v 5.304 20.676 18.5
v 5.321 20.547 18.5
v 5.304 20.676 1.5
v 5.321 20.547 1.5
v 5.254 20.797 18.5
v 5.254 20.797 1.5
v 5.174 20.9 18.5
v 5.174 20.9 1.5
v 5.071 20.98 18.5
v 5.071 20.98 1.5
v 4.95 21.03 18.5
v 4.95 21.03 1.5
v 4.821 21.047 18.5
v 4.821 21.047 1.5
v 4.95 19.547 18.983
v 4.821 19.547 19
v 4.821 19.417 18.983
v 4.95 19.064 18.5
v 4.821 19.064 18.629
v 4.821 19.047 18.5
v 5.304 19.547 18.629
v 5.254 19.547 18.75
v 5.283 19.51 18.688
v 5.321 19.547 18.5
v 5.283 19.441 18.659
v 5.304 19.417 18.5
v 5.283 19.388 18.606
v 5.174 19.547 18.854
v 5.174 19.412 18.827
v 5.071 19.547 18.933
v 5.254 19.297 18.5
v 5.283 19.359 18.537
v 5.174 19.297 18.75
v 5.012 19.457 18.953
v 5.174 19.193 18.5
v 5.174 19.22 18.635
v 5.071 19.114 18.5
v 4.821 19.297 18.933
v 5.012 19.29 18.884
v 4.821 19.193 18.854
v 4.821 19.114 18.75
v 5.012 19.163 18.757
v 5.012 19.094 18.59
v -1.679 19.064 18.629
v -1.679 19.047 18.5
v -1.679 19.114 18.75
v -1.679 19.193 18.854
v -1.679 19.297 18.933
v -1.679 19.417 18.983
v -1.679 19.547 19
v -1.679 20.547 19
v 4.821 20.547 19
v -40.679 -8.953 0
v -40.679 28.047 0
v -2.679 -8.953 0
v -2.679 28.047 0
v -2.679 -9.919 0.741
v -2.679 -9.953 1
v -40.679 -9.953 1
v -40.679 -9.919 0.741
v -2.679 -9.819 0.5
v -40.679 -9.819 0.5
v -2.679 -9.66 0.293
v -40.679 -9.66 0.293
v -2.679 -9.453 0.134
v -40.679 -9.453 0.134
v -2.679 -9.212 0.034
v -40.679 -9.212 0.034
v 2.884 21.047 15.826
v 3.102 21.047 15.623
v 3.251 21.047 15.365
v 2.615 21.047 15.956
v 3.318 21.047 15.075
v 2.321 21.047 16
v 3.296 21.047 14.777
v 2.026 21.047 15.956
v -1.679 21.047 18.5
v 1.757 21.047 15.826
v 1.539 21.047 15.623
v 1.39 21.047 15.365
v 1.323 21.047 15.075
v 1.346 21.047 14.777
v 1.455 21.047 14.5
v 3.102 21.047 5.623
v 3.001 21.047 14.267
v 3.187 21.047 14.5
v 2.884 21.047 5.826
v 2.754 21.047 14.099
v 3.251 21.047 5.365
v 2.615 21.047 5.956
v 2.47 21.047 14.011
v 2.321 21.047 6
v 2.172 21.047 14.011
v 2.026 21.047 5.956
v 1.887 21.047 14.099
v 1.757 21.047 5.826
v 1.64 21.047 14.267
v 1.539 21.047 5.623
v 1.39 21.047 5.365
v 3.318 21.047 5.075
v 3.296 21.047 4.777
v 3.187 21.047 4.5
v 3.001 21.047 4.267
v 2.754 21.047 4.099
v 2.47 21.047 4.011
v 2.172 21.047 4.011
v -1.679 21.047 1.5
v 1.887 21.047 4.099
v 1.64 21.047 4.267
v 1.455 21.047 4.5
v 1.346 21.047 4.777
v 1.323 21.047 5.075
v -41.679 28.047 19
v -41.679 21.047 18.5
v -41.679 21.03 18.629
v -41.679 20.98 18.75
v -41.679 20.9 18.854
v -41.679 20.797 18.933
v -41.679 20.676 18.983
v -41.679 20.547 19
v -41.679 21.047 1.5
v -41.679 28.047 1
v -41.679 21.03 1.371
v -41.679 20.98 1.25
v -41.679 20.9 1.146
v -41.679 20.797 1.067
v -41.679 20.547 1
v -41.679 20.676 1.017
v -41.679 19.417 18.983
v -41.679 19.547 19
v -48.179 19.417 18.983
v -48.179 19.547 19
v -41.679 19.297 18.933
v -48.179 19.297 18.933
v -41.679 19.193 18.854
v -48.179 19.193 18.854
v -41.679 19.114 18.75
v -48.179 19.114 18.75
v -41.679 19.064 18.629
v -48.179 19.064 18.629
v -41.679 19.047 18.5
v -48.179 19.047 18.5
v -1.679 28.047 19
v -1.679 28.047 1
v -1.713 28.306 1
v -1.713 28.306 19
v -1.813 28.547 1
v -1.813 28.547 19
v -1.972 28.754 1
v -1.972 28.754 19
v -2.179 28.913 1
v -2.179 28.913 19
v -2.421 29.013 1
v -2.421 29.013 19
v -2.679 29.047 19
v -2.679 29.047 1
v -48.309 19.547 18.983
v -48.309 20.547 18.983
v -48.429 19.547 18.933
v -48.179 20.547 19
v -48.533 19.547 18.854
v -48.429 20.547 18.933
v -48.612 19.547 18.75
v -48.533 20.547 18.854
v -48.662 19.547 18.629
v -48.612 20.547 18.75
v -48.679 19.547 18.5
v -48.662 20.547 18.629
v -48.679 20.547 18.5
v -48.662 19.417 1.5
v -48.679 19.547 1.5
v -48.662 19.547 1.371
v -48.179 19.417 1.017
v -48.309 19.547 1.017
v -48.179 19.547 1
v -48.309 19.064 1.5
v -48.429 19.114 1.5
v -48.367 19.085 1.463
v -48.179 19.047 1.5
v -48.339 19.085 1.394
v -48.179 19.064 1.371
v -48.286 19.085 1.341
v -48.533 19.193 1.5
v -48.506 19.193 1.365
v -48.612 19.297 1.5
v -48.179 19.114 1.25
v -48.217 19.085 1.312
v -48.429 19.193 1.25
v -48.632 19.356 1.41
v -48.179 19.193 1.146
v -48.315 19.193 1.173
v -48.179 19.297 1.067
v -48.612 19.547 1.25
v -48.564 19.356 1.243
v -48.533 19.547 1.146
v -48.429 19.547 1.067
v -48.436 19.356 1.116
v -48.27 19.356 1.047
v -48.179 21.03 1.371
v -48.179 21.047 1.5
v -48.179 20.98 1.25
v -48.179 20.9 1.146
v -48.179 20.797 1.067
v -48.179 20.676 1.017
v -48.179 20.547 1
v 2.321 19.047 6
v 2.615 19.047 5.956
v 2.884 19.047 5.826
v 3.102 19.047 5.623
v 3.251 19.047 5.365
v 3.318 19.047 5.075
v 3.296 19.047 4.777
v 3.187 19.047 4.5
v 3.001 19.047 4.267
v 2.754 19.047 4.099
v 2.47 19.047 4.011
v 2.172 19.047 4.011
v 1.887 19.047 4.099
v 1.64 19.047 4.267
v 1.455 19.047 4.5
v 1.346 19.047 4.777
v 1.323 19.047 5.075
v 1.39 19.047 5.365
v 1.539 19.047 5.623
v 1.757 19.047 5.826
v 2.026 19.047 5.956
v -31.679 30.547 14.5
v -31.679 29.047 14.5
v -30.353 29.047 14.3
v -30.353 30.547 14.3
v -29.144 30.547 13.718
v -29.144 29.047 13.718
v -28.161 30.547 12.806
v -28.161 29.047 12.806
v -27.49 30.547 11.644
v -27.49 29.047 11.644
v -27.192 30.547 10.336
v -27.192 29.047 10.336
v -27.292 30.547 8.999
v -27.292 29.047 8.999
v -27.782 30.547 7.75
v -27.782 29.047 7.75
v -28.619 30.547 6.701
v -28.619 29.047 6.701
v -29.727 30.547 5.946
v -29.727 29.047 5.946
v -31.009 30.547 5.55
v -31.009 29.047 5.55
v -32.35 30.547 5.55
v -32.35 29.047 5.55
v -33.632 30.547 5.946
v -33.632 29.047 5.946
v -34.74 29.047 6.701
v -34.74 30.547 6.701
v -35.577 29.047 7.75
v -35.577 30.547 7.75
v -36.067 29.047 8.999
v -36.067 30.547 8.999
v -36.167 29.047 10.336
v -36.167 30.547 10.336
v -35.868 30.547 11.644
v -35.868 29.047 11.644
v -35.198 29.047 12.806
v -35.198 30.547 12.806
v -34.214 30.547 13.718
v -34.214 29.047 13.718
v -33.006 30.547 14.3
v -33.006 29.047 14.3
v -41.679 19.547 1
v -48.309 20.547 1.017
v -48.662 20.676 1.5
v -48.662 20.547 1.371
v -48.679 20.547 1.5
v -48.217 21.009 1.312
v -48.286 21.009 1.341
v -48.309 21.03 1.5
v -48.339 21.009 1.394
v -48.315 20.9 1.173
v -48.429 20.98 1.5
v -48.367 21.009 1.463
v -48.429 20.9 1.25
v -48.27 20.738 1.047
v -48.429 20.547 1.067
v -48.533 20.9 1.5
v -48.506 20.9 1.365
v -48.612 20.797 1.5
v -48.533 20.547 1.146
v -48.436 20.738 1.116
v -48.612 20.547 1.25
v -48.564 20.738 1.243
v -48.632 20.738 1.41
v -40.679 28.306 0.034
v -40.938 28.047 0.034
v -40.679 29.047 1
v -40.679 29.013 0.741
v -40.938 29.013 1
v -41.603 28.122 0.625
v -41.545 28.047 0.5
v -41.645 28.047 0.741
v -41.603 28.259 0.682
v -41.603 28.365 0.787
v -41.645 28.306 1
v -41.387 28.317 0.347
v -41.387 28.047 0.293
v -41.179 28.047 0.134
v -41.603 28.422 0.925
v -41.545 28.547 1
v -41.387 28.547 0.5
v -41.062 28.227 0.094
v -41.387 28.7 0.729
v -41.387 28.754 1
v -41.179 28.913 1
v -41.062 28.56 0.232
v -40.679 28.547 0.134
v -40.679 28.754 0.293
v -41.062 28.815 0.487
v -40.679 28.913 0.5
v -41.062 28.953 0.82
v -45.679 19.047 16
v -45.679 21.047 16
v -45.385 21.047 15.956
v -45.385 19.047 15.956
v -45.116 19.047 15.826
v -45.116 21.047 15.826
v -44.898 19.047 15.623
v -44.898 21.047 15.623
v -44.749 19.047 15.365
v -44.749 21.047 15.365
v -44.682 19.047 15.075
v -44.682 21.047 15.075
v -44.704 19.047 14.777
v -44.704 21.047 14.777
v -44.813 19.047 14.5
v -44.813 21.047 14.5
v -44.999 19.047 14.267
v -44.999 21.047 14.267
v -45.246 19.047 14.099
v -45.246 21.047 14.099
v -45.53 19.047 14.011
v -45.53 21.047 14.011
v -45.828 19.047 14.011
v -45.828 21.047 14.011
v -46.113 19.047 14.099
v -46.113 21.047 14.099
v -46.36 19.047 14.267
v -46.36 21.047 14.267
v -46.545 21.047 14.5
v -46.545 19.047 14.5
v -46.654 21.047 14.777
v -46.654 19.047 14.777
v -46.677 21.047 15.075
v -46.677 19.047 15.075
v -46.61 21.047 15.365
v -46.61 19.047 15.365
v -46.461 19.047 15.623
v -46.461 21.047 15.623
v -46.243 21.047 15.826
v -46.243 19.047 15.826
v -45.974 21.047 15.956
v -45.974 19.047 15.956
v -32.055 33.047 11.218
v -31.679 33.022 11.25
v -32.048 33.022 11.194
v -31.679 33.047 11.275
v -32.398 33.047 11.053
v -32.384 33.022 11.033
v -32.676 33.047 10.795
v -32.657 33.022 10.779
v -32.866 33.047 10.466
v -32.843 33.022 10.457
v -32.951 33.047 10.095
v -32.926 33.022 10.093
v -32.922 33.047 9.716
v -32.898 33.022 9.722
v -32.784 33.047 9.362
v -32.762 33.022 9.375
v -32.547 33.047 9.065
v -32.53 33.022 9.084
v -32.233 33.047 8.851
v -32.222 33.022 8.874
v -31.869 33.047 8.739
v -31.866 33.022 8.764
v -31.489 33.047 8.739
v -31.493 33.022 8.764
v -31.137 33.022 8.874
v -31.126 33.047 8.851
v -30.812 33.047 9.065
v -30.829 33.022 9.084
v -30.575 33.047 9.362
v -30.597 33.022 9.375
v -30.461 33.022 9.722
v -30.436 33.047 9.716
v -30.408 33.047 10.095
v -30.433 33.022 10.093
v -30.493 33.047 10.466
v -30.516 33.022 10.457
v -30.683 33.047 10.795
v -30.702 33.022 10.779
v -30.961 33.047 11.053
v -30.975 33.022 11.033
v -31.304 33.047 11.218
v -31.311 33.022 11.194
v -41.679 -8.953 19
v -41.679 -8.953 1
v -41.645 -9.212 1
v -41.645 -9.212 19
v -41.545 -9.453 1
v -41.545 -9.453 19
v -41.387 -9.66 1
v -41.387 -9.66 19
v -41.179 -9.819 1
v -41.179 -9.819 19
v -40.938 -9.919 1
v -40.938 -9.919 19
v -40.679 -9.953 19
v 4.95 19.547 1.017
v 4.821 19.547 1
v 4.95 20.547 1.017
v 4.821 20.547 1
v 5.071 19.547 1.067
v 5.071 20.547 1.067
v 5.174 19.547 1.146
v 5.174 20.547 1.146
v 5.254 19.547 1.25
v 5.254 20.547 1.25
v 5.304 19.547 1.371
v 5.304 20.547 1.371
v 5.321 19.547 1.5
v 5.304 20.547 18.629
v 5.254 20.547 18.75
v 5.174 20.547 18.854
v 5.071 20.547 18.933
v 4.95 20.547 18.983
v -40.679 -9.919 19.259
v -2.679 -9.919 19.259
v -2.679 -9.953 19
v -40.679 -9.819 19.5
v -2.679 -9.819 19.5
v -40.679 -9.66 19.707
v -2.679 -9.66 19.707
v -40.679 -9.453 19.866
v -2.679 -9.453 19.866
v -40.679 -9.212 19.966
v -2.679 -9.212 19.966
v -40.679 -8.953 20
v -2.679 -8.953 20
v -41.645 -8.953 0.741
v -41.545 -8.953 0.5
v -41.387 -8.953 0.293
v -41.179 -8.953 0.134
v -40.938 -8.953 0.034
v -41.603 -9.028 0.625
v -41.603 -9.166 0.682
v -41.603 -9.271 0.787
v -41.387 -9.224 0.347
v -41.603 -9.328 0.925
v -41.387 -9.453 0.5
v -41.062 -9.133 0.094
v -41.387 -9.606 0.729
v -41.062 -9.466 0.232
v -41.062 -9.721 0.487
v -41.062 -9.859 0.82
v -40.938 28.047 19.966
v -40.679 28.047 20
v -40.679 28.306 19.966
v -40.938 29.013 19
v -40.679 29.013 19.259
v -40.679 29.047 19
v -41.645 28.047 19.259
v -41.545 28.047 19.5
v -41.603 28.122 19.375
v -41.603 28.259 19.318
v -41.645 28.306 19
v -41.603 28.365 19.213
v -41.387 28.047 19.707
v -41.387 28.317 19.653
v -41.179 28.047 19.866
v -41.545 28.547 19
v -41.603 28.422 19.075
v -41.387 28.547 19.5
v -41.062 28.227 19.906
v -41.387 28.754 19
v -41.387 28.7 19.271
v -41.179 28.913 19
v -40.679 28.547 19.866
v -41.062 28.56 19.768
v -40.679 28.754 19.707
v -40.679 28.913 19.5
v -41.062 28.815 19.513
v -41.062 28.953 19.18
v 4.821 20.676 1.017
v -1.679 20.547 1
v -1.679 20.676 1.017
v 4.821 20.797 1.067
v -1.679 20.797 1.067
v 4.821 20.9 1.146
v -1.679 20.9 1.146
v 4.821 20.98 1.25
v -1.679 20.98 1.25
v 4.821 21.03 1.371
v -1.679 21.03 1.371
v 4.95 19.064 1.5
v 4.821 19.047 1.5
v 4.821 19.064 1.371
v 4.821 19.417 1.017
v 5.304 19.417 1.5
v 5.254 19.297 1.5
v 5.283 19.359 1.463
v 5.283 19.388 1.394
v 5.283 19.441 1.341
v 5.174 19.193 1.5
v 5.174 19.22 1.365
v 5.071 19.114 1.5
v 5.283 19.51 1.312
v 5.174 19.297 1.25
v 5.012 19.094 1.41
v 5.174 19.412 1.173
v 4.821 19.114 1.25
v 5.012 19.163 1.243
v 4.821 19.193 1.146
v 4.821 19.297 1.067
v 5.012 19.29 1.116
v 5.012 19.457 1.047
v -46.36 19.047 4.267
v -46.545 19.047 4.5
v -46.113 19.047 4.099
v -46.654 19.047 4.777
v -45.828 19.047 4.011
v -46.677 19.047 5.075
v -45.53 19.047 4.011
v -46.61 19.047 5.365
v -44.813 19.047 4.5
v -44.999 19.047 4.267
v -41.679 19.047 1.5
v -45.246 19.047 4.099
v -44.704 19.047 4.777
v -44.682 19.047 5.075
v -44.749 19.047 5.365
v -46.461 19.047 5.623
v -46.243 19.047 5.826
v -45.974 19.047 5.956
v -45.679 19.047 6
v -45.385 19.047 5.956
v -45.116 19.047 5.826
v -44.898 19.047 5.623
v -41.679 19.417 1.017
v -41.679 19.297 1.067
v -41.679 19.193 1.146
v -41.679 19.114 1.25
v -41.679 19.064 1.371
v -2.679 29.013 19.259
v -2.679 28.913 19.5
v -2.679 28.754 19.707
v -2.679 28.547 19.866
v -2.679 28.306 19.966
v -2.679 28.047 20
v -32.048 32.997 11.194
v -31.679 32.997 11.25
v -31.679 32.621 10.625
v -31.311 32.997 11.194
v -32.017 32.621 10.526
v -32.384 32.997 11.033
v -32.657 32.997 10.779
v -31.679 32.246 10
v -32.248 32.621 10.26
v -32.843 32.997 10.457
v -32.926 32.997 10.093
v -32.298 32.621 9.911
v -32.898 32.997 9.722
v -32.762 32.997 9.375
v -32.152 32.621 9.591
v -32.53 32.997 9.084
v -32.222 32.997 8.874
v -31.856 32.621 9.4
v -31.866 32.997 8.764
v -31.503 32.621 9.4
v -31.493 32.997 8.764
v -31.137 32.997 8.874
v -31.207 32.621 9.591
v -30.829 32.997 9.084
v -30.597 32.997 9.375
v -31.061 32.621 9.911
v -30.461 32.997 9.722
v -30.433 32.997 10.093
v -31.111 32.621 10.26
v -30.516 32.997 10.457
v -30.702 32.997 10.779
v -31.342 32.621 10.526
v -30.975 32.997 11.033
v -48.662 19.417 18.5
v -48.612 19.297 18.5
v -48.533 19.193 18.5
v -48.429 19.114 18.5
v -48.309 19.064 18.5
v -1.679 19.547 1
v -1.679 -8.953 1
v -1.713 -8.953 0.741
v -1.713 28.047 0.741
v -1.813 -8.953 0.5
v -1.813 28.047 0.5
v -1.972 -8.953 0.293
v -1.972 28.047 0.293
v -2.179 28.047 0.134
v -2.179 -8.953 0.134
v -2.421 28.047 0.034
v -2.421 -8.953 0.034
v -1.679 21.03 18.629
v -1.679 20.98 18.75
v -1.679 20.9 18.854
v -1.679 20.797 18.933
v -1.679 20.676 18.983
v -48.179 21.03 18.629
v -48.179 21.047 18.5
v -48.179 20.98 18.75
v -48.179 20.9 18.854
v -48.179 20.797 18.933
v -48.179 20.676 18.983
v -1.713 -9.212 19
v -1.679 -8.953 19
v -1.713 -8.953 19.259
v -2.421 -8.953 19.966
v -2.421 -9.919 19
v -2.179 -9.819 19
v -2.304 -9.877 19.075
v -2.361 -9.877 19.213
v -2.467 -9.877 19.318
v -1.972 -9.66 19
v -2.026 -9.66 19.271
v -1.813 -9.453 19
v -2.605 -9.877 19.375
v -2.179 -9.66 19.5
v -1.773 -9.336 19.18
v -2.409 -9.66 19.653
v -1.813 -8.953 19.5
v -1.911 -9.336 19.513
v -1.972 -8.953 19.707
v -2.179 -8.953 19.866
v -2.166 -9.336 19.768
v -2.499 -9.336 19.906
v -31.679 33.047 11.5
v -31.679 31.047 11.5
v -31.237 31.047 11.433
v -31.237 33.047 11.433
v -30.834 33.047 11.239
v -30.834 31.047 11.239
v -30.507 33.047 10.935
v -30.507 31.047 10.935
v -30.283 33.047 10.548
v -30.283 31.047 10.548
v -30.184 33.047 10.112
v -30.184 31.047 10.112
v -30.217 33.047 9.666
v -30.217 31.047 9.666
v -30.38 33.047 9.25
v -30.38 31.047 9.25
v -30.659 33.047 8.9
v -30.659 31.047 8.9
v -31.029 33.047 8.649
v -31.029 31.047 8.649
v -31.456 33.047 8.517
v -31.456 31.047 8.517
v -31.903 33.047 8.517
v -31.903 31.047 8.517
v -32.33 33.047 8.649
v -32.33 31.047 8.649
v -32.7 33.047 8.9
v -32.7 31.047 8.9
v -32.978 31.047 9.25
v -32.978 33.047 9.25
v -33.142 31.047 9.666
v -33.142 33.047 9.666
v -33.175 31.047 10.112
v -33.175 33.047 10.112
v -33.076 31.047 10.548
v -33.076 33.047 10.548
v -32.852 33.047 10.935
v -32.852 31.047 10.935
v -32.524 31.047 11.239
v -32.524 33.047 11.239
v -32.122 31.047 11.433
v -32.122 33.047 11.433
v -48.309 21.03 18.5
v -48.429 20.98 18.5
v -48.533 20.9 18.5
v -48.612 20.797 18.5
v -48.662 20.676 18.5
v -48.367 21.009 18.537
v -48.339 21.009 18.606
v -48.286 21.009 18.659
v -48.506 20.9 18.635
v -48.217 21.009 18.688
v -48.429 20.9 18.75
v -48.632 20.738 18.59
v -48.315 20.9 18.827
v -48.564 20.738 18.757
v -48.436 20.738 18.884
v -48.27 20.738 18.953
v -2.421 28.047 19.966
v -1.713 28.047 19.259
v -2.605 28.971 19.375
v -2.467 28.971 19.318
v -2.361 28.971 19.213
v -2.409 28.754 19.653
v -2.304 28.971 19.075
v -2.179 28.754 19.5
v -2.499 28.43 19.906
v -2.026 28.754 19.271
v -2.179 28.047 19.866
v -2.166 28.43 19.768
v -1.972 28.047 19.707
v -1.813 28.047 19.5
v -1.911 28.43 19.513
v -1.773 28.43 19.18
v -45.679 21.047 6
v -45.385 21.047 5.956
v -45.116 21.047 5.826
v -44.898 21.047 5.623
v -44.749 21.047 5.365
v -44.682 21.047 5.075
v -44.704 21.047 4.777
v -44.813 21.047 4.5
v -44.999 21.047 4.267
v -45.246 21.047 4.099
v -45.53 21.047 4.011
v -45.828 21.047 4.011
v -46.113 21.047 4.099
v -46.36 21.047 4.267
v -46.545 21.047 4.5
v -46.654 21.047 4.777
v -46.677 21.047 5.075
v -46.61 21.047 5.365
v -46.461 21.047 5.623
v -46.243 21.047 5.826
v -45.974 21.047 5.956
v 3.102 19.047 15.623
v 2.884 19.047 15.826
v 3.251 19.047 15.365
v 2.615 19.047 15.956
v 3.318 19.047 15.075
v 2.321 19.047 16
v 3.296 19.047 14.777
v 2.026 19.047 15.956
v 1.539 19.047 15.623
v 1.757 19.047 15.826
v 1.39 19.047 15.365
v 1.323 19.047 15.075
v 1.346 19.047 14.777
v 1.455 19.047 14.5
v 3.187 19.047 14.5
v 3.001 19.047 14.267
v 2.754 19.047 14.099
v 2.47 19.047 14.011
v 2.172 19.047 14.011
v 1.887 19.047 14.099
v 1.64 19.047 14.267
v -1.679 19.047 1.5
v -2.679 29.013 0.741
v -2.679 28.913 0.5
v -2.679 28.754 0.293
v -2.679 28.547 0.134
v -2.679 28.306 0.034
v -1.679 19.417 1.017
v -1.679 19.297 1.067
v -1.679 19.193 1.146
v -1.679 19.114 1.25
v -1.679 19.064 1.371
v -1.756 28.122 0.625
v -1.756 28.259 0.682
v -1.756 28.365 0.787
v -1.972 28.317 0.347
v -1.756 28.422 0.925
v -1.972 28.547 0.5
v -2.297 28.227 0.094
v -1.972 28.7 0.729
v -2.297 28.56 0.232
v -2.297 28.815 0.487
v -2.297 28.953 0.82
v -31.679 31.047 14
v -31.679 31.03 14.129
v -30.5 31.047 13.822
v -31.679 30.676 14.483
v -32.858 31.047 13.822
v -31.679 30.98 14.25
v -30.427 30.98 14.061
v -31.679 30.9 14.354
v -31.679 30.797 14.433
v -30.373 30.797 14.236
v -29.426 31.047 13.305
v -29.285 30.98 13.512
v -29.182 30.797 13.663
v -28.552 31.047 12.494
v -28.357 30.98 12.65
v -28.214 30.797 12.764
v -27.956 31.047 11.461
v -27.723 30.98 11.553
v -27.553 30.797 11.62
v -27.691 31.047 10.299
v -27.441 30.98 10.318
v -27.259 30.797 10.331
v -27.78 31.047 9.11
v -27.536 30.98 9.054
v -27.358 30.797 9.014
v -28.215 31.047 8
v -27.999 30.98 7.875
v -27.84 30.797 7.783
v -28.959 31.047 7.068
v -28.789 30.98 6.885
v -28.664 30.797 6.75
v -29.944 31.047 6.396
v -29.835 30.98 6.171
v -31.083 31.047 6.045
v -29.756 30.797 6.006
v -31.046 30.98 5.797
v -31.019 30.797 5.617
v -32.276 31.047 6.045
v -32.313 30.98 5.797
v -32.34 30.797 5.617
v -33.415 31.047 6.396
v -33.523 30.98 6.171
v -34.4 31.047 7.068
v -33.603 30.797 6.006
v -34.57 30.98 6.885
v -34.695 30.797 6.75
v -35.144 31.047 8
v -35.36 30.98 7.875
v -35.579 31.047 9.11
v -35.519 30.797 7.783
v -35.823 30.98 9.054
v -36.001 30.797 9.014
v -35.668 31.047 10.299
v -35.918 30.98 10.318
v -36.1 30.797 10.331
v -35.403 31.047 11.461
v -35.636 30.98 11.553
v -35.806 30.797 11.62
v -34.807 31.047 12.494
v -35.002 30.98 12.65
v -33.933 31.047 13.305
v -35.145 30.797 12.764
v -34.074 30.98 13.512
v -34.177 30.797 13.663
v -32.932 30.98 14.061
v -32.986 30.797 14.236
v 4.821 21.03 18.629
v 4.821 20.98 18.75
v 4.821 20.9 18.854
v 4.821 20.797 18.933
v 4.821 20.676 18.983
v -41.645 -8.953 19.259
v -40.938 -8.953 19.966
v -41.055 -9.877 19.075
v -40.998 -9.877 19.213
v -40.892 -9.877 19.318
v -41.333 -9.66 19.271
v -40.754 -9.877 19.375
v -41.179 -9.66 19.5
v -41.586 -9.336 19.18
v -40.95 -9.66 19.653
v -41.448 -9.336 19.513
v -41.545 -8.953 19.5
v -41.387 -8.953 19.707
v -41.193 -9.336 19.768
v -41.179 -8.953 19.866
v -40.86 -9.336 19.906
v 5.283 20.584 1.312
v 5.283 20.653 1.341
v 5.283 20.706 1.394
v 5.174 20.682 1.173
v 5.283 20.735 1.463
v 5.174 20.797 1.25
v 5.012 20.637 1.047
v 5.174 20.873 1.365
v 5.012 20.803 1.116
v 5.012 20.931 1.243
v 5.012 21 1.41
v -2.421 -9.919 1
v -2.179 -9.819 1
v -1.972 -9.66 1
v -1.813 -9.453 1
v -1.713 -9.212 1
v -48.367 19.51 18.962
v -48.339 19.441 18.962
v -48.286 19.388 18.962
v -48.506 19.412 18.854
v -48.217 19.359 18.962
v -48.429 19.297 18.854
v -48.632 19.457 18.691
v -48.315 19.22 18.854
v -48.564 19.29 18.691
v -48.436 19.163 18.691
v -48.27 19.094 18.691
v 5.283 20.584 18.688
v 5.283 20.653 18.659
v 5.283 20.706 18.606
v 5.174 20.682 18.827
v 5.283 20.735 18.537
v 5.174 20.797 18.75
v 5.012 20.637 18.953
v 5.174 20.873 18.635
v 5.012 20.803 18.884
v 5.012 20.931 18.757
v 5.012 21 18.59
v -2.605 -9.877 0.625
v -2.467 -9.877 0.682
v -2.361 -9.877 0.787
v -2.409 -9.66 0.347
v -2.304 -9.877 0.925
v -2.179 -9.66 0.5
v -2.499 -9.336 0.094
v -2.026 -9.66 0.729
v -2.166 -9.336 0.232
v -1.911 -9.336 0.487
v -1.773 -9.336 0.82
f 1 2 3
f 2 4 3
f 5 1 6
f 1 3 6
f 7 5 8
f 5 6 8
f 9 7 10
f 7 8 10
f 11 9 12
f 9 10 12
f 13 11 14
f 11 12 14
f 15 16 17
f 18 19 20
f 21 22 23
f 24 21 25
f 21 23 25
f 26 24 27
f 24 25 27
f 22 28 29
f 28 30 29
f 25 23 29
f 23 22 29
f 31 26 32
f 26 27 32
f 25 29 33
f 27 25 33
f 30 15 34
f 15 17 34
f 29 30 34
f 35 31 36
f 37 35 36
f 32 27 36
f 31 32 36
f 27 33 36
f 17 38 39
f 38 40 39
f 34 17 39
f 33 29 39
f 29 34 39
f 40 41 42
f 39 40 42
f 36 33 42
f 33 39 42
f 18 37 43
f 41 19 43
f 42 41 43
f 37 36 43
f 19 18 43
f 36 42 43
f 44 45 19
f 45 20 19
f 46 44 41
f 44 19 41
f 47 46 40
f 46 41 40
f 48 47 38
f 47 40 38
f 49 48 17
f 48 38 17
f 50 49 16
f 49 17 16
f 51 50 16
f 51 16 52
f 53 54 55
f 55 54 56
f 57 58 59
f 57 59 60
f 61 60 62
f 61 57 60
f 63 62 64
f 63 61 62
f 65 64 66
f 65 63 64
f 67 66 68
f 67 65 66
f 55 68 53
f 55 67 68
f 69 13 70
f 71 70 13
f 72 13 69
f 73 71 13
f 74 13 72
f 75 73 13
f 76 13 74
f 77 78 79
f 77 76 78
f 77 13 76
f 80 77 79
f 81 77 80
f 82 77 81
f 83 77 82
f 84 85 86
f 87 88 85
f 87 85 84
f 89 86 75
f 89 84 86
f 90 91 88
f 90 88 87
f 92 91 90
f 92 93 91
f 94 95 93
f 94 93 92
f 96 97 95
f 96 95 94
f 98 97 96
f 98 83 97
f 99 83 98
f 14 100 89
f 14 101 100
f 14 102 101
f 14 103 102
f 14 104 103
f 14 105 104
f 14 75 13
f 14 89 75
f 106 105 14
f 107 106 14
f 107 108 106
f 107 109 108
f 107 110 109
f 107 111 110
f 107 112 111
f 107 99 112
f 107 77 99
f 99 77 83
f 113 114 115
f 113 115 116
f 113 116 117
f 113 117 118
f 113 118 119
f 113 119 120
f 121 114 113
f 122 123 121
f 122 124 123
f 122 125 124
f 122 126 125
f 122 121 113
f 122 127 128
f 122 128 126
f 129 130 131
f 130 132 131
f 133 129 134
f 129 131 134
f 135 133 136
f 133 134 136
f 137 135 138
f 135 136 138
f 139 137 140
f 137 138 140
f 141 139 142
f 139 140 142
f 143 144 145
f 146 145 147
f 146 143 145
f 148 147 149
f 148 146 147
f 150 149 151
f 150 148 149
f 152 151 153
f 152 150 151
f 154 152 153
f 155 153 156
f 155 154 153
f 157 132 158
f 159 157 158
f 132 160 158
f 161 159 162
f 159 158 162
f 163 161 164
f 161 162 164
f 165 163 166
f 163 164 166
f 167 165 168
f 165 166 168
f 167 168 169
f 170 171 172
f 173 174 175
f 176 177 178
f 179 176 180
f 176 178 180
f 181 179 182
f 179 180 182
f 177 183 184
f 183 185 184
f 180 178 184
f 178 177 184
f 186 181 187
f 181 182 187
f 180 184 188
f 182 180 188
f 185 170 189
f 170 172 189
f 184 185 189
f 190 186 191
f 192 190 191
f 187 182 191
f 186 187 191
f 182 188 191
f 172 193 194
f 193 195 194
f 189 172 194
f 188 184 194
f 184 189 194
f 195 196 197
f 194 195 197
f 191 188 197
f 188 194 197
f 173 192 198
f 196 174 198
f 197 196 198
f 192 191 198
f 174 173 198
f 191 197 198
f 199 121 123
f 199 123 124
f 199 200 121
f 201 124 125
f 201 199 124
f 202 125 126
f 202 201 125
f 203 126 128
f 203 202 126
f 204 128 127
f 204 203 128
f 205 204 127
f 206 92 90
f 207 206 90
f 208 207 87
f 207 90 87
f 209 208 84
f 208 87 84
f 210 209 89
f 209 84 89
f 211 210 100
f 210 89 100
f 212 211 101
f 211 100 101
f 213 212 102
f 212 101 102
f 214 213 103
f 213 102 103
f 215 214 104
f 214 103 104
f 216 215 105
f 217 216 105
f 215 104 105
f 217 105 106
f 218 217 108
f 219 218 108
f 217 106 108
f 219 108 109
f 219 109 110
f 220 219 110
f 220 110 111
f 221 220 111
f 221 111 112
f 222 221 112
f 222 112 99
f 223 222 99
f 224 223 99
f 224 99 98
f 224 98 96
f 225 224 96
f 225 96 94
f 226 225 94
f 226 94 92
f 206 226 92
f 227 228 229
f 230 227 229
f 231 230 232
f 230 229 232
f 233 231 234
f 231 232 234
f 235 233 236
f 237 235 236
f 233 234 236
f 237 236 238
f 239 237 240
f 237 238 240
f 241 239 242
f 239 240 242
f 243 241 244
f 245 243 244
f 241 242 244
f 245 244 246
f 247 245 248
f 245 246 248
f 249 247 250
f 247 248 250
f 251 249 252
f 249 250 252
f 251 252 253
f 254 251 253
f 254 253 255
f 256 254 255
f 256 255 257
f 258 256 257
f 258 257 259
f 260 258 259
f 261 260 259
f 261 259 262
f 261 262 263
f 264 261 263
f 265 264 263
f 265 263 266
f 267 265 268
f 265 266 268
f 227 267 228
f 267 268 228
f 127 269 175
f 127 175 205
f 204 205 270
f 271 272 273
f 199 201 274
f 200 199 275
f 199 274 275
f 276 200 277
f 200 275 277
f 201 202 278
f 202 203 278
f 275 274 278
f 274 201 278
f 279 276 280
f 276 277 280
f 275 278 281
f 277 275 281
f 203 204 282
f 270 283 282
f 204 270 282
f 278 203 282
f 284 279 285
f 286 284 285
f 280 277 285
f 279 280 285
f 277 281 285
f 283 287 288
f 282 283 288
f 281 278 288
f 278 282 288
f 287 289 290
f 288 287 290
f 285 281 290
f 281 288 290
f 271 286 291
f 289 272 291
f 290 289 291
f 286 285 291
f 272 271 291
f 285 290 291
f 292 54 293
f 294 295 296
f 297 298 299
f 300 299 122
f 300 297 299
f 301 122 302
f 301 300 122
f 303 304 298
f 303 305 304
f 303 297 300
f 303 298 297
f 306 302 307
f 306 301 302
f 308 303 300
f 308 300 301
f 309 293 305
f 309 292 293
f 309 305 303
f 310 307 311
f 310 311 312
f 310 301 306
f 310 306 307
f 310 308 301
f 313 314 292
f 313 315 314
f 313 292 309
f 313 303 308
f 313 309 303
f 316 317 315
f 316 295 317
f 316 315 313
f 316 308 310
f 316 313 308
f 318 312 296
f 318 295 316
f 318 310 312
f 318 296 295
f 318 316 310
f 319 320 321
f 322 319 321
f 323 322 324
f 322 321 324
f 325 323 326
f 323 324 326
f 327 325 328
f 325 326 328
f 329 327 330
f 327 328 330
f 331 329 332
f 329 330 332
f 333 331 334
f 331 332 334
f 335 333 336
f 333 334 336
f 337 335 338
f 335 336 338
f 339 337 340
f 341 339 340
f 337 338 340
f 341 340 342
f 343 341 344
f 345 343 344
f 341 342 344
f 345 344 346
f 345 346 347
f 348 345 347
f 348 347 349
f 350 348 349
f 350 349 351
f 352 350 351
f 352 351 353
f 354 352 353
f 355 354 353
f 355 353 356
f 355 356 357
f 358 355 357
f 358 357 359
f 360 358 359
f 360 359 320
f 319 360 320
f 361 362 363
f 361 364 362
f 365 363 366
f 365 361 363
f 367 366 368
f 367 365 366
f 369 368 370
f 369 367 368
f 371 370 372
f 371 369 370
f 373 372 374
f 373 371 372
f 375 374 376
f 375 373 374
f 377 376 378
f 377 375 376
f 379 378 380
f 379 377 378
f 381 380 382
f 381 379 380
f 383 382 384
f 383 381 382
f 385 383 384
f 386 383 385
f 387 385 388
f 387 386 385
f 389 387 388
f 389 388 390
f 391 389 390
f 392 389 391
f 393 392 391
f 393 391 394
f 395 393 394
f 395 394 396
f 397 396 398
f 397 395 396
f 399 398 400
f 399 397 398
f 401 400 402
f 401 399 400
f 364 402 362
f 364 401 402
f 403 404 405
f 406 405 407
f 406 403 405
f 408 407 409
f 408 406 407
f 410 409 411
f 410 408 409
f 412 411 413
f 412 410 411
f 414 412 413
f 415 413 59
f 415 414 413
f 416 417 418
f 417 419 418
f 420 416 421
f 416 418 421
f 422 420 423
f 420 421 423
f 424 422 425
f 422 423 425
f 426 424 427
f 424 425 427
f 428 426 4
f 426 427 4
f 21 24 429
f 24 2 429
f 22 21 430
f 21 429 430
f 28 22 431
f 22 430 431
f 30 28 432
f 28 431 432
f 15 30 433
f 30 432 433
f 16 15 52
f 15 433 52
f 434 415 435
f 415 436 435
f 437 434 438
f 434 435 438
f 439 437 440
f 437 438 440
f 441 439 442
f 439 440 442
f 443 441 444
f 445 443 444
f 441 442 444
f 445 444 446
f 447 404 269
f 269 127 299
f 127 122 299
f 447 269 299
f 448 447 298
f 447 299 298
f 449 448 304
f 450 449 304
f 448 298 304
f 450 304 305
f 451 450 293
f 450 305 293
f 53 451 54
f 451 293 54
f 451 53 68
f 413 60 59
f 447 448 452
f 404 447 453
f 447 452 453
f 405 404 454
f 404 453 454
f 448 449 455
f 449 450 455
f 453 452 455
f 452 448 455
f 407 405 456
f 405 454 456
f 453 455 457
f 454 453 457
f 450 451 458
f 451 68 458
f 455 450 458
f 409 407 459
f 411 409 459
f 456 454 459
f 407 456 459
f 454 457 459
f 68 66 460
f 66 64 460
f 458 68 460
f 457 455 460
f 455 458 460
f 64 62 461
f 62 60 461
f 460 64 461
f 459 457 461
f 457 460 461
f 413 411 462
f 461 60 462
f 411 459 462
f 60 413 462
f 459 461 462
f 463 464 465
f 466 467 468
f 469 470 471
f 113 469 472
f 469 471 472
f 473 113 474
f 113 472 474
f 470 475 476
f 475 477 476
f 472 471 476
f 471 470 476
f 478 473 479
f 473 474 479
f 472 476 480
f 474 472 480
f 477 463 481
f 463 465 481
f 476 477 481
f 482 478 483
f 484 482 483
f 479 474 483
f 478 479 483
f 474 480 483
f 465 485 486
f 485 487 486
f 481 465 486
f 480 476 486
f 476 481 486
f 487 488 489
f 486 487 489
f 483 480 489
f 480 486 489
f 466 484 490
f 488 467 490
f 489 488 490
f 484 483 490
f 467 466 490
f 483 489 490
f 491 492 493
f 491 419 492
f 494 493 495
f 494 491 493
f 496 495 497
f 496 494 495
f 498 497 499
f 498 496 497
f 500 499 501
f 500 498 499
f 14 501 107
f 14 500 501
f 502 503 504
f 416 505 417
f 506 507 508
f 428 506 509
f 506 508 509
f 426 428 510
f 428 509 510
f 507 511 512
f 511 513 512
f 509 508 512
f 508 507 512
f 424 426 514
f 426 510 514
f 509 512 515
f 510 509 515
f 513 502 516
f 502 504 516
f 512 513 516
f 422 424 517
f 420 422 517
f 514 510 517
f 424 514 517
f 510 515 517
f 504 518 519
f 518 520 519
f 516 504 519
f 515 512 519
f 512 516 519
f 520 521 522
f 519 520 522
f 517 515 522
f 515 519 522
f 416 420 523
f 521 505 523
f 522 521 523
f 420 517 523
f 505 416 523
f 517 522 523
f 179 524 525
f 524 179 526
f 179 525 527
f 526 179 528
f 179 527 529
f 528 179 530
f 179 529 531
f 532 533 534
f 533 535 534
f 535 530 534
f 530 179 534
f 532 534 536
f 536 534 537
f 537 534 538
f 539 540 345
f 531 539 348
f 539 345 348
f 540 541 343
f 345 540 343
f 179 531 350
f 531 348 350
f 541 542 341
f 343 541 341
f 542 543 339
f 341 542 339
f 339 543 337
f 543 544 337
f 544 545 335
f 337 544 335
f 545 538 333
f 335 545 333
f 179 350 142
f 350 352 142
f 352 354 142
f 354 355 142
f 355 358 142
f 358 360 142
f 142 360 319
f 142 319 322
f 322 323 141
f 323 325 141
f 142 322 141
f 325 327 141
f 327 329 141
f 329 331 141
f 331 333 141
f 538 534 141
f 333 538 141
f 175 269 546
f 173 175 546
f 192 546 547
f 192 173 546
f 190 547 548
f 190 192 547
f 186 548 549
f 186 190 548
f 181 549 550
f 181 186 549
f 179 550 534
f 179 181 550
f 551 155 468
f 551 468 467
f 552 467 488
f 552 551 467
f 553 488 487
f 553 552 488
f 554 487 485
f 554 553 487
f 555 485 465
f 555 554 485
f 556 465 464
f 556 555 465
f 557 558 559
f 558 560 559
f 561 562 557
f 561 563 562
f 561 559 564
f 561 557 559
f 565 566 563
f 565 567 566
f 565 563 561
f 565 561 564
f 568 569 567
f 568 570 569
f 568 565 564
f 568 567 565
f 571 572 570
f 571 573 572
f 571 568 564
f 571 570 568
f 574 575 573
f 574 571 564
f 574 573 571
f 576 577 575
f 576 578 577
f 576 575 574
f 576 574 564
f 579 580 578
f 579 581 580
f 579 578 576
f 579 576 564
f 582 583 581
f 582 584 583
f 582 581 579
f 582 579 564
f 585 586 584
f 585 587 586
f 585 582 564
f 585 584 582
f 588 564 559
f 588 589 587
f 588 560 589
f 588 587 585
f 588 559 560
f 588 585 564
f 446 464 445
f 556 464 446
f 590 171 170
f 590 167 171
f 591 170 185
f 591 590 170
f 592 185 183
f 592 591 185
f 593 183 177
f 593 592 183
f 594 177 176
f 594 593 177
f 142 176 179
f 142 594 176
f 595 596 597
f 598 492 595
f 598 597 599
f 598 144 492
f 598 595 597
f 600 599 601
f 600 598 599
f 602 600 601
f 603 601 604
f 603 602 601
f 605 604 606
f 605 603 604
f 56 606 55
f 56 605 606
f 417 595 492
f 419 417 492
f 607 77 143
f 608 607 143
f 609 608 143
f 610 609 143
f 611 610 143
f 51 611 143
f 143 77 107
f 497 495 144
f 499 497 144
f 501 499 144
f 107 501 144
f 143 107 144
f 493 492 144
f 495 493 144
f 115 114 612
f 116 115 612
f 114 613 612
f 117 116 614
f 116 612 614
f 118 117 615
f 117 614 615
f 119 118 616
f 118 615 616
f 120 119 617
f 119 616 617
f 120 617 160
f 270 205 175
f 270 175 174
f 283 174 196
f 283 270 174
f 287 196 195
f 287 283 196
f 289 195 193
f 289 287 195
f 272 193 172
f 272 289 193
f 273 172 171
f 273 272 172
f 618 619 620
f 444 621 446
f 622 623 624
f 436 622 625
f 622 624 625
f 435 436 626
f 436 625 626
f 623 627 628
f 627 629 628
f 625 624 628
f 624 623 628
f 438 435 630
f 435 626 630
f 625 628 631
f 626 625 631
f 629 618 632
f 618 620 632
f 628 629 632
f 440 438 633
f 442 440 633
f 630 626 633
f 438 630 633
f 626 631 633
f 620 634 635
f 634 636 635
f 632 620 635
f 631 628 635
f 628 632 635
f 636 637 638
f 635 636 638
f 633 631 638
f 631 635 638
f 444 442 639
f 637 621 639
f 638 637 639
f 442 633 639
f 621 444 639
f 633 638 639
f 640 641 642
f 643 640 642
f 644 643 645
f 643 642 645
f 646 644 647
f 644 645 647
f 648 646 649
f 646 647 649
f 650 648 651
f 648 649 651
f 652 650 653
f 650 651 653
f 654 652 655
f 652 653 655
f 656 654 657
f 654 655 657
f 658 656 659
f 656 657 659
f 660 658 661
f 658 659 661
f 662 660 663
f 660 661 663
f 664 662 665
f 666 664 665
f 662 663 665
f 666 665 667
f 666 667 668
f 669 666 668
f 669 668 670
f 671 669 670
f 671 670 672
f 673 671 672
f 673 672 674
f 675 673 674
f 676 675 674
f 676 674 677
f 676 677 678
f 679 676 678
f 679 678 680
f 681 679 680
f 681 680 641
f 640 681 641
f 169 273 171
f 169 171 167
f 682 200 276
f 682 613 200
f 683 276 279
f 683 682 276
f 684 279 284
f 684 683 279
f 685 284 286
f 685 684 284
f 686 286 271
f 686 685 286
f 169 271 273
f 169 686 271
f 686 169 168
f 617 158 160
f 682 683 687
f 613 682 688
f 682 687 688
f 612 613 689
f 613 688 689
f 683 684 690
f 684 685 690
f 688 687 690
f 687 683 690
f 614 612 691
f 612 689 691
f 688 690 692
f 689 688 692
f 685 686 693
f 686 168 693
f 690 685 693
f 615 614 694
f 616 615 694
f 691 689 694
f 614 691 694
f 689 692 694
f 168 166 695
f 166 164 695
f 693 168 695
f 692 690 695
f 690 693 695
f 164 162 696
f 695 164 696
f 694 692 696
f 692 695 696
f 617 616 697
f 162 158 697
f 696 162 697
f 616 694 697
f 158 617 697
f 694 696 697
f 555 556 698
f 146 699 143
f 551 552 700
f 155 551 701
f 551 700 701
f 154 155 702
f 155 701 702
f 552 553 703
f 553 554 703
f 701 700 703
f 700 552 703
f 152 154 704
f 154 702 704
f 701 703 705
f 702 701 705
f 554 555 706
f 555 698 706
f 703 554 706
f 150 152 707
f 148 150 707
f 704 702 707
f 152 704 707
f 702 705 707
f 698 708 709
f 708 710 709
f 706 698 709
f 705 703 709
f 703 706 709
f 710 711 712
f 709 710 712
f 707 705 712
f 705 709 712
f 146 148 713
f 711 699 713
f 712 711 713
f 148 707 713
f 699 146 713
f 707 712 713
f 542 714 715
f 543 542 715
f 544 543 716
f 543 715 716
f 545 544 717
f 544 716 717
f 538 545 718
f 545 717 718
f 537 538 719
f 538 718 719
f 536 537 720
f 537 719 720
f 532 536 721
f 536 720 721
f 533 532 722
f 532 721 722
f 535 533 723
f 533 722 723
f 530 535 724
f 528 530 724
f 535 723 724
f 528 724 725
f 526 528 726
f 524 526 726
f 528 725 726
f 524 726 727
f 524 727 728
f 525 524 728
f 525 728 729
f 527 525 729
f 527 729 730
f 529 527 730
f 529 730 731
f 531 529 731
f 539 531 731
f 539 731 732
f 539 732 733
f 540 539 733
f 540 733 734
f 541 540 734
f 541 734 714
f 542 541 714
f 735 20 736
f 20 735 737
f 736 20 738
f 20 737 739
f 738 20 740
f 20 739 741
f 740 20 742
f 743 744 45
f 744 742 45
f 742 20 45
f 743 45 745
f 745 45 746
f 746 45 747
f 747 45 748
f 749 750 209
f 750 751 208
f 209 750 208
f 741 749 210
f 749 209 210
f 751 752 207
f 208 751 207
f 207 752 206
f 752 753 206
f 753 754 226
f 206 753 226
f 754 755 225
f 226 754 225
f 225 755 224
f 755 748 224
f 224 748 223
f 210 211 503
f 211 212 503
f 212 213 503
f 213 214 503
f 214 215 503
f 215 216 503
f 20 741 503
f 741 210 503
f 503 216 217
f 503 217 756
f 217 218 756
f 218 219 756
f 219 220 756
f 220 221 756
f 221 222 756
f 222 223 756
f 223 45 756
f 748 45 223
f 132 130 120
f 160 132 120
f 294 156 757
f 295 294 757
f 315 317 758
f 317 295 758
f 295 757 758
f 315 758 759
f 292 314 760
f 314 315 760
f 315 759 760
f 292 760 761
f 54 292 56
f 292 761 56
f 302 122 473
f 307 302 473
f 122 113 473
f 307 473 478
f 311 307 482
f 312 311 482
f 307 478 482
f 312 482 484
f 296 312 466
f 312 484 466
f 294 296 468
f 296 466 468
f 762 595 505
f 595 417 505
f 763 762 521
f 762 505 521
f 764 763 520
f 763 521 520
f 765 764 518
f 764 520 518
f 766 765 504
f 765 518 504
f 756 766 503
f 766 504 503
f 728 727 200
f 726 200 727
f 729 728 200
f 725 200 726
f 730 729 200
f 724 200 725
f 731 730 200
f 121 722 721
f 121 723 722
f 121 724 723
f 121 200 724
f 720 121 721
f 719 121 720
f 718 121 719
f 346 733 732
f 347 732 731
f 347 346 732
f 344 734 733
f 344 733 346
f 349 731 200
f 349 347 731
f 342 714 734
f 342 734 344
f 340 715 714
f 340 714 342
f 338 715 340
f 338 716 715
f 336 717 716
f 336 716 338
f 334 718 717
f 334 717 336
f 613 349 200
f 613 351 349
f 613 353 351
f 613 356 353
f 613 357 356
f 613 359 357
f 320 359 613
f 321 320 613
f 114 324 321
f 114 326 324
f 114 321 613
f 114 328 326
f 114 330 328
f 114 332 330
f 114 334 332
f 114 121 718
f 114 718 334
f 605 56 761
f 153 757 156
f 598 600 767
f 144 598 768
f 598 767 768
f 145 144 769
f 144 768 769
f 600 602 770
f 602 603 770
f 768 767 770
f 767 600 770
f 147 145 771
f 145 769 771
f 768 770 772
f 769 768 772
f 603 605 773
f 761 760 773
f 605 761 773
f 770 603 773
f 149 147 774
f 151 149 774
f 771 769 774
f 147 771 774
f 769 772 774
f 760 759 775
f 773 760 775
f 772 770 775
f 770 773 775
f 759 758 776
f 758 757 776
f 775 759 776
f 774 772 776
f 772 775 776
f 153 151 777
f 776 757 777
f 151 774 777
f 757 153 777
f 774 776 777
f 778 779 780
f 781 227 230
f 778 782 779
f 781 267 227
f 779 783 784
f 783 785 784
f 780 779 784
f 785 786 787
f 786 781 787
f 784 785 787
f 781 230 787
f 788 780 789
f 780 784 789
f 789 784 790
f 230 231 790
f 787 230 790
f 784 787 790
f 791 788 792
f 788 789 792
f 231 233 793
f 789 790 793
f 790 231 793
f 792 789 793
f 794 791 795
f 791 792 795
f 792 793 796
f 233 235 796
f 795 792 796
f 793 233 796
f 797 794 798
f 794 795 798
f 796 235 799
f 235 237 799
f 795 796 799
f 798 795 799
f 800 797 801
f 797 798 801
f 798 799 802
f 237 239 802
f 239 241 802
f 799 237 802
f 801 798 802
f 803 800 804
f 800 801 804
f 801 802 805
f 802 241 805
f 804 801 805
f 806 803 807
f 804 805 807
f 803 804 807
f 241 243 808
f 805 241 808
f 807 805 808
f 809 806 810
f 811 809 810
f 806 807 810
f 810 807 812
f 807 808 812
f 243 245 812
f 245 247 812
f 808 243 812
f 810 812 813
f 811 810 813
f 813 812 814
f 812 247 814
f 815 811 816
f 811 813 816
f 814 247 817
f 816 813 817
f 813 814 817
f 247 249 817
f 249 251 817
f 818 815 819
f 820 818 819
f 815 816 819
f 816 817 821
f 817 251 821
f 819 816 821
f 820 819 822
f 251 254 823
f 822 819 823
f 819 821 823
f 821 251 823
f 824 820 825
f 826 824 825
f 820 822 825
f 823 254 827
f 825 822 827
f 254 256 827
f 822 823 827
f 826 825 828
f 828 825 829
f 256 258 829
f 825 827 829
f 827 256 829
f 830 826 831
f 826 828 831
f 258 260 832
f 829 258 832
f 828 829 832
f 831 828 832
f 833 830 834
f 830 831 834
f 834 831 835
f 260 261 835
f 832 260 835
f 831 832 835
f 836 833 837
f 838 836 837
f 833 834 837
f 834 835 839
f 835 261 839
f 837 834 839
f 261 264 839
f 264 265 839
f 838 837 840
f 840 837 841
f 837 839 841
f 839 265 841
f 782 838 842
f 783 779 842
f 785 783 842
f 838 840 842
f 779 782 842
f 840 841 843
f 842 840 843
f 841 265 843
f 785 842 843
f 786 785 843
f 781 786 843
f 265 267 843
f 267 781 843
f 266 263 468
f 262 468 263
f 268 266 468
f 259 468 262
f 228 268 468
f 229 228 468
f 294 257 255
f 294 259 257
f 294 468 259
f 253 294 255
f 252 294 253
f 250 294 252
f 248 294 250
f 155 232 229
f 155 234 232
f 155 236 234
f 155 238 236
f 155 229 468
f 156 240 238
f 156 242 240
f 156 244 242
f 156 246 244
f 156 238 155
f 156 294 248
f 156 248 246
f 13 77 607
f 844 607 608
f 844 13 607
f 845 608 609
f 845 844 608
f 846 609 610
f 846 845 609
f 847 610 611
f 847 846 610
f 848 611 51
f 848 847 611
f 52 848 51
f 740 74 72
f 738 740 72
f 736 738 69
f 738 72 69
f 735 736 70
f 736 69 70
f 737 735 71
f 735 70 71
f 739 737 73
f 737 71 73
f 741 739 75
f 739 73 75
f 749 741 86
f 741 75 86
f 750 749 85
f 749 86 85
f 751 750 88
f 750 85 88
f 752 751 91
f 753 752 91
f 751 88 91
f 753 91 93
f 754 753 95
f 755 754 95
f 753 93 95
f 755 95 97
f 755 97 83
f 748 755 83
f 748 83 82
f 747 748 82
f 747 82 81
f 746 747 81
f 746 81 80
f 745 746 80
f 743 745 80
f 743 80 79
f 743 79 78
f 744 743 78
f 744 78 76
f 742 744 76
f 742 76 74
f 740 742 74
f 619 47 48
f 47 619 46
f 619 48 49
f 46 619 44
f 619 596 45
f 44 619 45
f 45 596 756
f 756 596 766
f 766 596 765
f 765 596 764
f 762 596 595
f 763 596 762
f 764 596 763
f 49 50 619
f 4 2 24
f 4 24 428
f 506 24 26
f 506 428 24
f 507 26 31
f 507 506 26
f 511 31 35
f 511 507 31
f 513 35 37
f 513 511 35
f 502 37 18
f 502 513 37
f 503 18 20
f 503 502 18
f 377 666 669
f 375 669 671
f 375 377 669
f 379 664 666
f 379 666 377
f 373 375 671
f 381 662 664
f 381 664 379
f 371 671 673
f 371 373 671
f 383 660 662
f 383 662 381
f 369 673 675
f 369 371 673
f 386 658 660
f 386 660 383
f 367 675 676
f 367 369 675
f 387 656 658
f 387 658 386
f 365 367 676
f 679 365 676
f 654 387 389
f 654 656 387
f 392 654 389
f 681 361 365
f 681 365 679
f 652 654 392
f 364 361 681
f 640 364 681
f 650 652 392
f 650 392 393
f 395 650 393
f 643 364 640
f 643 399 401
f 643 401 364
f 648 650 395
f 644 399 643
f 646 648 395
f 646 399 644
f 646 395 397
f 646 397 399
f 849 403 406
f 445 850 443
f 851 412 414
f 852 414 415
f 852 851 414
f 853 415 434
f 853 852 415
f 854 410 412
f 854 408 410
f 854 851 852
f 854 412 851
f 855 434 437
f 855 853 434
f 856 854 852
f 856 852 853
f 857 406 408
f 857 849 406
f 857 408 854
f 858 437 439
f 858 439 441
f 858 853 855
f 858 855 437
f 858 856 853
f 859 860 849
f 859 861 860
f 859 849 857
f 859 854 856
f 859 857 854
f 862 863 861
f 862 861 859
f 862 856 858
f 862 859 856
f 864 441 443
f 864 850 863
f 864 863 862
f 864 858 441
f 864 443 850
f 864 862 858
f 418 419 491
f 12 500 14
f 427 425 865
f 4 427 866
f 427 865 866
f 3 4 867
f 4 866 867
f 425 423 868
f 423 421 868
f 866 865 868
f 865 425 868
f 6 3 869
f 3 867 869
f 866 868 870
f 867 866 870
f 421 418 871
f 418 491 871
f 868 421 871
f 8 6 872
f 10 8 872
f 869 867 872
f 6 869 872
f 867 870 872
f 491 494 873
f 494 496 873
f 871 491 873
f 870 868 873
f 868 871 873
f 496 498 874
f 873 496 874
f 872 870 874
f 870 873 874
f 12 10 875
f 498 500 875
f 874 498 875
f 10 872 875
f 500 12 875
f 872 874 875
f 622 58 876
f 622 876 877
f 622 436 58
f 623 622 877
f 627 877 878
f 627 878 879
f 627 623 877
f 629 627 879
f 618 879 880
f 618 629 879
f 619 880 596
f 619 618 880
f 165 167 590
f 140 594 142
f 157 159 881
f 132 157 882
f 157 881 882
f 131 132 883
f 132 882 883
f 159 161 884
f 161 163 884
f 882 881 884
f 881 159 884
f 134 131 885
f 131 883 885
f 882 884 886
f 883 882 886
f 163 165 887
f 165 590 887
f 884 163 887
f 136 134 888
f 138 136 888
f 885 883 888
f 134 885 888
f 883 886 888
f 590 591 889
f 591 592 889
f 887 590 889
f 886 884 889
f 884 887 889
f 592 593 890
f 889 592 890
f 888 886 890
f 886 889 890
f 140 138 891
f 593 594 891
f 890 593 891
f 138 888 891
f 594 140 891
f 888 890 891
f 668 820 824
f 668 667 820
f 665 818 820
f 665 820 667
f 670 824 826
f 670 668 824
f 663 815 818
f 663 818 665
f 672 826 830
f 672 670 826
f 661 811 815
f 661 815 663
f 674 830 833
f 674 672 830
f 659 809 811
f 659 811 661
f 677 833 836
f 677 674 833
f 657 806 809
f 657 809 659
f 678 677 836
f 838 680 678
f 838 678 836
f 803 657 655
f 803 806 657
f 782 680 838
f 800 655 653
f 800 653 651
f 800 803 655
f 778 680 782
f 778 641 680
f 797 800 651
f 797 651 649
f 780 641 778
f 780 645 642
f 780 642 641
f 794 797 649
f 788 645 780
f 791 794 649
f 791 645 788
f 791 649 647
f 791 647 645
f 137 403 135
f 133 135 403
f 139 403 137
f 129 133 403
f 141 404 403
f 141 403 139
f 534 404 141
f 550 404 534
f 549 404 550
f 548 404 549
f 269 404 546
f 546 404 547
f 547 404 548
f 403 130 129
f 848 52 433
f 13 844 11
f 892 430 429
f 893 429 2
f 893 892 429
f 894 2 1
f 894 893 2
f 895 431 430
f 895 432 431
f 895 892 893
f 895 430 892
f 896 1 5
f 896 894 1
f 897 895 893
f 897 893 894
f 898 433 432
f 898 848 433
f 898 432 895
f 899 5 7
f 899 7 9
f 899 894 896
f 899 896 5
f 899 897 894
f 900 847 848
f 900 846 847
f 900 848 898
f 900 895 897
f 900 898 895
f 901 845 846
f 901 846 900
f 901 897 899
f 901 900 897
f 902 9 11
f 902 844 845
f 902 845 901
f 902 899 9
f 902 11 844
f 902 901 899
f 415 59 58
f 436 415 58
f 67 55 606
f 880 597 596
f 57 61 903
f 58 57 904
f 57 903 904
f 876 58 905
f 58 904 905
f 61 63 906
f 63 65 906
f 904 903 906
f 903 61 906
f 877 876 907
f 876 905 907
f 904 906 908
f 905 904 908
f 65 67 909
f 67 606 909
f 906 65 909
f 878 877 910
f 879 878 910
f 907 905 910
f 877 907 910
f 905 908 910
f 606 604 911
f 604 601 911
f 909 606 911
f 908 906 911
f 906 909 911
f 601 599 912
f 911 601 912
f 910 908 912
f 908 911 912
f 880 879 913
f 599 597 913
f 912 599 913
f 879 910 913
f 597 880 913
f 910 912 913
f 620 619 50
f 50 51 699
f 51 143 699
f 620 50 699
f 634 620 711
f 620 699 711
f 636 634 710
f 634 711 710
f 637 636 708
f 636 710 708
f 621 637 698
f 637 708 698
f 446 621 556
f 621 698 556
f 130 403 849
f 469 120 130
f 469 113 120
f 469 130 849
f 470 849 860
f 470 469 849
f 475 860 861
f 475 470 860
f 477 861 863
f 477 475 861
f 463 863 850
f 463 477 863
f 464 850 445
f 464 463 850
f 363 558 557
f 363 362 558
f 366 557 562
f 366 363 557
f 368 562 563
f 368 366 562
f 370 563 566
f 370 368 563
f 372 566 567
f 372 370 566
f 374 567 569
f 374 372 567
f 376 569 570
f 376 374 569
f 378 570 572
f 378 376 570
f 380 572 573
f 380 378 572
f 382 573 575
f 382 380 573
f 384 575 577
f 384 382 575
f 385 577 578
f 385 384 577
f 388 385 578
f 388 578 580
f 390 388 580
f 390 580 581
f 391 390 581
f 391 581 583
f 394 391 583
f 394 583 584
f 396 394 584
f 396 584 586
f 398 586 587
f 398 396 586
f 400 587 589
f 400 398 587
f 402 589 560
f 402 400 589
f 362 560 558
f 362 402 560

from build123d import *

# Parameters (mm, degrees)
SKETCH_2_W          = 40
SKETCH_2_H          = 39
EXTRUDE_1_DEPTH     = 20
FILLET_1_R          = 1
SKETCH_7_W          = 18
SKETCH_7_H          = 2
EXTRUDE_3_DEPTH     = 7
SKETCH_8_W          = 18
SKETCH_8_H          = 2
EXTRUDE_4_DEPTH     = 7
SKETCH_11_R         = 1
CUT_EXTRUDE_2_DEPTH = 62.079339492
SKETCH_12_R         = 4.5
EXTRUDE_5_DEPTH     = 2
SKETCH_13_R         = 1.5
EXTRUDE_6_DEPTH     = 4
FILLET_2_R          = 0.5
FILLET_3_R          = 0.5
FILLET_4_R          = 0.5
SKETCH_10_R         = 1
CUT_EXTRUDE_3_DEPTH = 62.079339492


with BuildPart() as part:
    # 草图2 → 凸台-拉伸1 (new body)
    with BuildSketch(Plane.XY):
        with Locations((-21.679417753, 9.546852913)):
            Rectangle(SKETCH_2_W, SKETCH_2_H)
    extrude(amount=EXTRUDE_1_DEPTH)

    # 圆角1
    fillet_1_edges = [part.edges().sort_by_distance(p)[0] for p in [
        (-1.679417753, 9.546852913, 20),
        (-21.679417753, 29.046852913, 20),
        (-41.679417753, 9.546852913, 20),
        (-21.679417753, 29.046852913, 0),
        (-1.679417753, 9.546852913, 0),
        (-21.679417753, -9.953147087, 0),
        (-41.679417753, 9.546852913, 0),
        (-41.679417753, 29.046852913, 10),
        (-1.679417753, 29.046852913, 10),
        (-1.679417753, -9.953147087, 10),
        (-41.679417753, -9.953147087, 10),
        (-21.679417753, -9.953147087, 20),
    ]]
    fillet(fillet_1_edges, radius=FILLET_1_R)

    # 草图7 → 凸台-拉伸3 (add)
    with BuildSketch(Plane.ZY.offset(41.679417753)):
        with Locations((10, 20.046852913)):
            Rectangle(SKETCH_7_W, SKETCH_7_H)
    extrude(amount=EXTRUDE_3_DEPTH)

    # 草图8 → 凸台-拉伸4 (add)
    with BuildSketch(Plane(origin=(-1.679417753, 0, 0), x_dir=(0, 0, -1), z_dir=(1, 0, 0))):
        with Locations((-10, 20.046852913)):
            Rectangle(SKETCH_8_W, SKETCH_8_H)
    extrude(amount=EXTRUDE_4_DEPTH)

    # 草图11 → 切除-拉伸2 (cut, through all)
    with BuildSketch(Plane(origin=(0, 21.046852913, 0), x_dir=(1, 0, 0), z_dir=(0, 1, 0))):
        with Locations(Location((2.320582247, -5, 0), (0, 0, 270))):
            Circle(SKETCH_11_R)
        with Locations(Location((2.320582247, -15, 0), (0, 0, 270))):
            Circle(SKETCH_11_R)
    extrude(amount=-CUT_EXTRUDE_2_DEPTH, mode=Mode.SUBTRACT)

    # 草图12 → 凸台-拉伸5 (add)
    with BuildSketch(Plane(origin=(0, 29.046852913, 0), x_dir=(1, 0, 0), z_dir=(0, 1, 0))):
        with Locations(Location((-31.679417753, -10, 0), (0, 0, 270))):
            Circle(SKETCH_12_R)
    extrude(amount=EXTRUDE_5_DEPTH)

    # 草图13 → 凸台-拉伸6 (add)
    with BuildSketch(Plane(origin=(0, 29.046852913, 0), x_dir=(1, 0, 0), z_dir=(0, 1, 0))):
        with Locations(Location((-31.679417753, -10, 0), (0, 0, 270))):
            Circle(SKETCH_13_R)
    extrude(amount=EXTRUDE_6_DEPTH)

    # 圆角2
    fillet_2_edges = [part.edges().sort_by_distance(p)[0] for p in [
        (-31.679417753, 31.046852913, 5.5),
    ]]
    fillet(fillet_2_edges, radius=FILLET_2_R)

    # 草图17 → M3 螺纹孔的螺纹孔钻头1 (revolve, cut)
    with BuildSketch(Plane(origin=(-31.679417753, 33.046852913, 10), x_dir=(0, 0, 1), z_dir=(1, 0, 0))):
        Polygon((0, 0), (0, 0.801075774), (1.25, 0.05), (1.25, 0.025), (1.275, 0), align=None)
    revolve(axis=Axis((-31.679417753, 39.396852913, 10), (0, -1, 0)), mode=Mode.SUBTRACT)

    # 圆角3
    fillet_3_edges = [part.edges().sort_by_distance(p)[0] for p in [
        (-48.679417753, 20.046852913, 1),
        (-45.179417753, 21.046852913, 1),
        (-48.679417753, 19.046852913, 10),
        (-45.179417753, 19.046852913, 1),
        (-48.679417753, 20.046852913, 19),
        (-45.179417753, 19.046852913, 19),
        (-48.679417753, 21.046852913, 10),
        (-45.179417753, 21.046852913, 19),
    ]]
    fillet(fillet_3_edges, radius=FILLET_3_R)

    # 圆角4
    fillet_4_edges = [part.edges().sort_by_distance(p)[0] for p in [
        (1.820582247, 21.046852913, 19),
        (1.820582247, 19.046852913, 19),
        (1.820582247, 19.046852913, 1),
        (1.820582247, 21.046852913, 1),
        (5.320582247, 20.046852913, 19),
        (5.320582247, 19.046852913, 10),
        (5.320582247, 20.046852913, 1),
        (5.320582247, 21.046852913, 10),
    ]]
    fillet(fillet_4_edges, radius=FILLET_4_R)

    # 草图10 → 切除-拉伸3 (cut, through all)
    with BuildSketch(Plane(origin=(0, 21.046852913, 0), x_dir=(1, 0, 0), z_dir=(0, 1, 0))):
        with Locations(Location((-45.679417753, -5, 0), (0, 0, 270))):
            Circle(SKETCH_10_R)
        with Locations(Location((-45.679417753, -15, 0), (0, 0, 270))):
            Circle(SKETCH_10_R)
    extrude(amount=-CUT_EXTRUDE_3_DEPTH, mode=Mode.SUBTRACT)


solid = part.part
